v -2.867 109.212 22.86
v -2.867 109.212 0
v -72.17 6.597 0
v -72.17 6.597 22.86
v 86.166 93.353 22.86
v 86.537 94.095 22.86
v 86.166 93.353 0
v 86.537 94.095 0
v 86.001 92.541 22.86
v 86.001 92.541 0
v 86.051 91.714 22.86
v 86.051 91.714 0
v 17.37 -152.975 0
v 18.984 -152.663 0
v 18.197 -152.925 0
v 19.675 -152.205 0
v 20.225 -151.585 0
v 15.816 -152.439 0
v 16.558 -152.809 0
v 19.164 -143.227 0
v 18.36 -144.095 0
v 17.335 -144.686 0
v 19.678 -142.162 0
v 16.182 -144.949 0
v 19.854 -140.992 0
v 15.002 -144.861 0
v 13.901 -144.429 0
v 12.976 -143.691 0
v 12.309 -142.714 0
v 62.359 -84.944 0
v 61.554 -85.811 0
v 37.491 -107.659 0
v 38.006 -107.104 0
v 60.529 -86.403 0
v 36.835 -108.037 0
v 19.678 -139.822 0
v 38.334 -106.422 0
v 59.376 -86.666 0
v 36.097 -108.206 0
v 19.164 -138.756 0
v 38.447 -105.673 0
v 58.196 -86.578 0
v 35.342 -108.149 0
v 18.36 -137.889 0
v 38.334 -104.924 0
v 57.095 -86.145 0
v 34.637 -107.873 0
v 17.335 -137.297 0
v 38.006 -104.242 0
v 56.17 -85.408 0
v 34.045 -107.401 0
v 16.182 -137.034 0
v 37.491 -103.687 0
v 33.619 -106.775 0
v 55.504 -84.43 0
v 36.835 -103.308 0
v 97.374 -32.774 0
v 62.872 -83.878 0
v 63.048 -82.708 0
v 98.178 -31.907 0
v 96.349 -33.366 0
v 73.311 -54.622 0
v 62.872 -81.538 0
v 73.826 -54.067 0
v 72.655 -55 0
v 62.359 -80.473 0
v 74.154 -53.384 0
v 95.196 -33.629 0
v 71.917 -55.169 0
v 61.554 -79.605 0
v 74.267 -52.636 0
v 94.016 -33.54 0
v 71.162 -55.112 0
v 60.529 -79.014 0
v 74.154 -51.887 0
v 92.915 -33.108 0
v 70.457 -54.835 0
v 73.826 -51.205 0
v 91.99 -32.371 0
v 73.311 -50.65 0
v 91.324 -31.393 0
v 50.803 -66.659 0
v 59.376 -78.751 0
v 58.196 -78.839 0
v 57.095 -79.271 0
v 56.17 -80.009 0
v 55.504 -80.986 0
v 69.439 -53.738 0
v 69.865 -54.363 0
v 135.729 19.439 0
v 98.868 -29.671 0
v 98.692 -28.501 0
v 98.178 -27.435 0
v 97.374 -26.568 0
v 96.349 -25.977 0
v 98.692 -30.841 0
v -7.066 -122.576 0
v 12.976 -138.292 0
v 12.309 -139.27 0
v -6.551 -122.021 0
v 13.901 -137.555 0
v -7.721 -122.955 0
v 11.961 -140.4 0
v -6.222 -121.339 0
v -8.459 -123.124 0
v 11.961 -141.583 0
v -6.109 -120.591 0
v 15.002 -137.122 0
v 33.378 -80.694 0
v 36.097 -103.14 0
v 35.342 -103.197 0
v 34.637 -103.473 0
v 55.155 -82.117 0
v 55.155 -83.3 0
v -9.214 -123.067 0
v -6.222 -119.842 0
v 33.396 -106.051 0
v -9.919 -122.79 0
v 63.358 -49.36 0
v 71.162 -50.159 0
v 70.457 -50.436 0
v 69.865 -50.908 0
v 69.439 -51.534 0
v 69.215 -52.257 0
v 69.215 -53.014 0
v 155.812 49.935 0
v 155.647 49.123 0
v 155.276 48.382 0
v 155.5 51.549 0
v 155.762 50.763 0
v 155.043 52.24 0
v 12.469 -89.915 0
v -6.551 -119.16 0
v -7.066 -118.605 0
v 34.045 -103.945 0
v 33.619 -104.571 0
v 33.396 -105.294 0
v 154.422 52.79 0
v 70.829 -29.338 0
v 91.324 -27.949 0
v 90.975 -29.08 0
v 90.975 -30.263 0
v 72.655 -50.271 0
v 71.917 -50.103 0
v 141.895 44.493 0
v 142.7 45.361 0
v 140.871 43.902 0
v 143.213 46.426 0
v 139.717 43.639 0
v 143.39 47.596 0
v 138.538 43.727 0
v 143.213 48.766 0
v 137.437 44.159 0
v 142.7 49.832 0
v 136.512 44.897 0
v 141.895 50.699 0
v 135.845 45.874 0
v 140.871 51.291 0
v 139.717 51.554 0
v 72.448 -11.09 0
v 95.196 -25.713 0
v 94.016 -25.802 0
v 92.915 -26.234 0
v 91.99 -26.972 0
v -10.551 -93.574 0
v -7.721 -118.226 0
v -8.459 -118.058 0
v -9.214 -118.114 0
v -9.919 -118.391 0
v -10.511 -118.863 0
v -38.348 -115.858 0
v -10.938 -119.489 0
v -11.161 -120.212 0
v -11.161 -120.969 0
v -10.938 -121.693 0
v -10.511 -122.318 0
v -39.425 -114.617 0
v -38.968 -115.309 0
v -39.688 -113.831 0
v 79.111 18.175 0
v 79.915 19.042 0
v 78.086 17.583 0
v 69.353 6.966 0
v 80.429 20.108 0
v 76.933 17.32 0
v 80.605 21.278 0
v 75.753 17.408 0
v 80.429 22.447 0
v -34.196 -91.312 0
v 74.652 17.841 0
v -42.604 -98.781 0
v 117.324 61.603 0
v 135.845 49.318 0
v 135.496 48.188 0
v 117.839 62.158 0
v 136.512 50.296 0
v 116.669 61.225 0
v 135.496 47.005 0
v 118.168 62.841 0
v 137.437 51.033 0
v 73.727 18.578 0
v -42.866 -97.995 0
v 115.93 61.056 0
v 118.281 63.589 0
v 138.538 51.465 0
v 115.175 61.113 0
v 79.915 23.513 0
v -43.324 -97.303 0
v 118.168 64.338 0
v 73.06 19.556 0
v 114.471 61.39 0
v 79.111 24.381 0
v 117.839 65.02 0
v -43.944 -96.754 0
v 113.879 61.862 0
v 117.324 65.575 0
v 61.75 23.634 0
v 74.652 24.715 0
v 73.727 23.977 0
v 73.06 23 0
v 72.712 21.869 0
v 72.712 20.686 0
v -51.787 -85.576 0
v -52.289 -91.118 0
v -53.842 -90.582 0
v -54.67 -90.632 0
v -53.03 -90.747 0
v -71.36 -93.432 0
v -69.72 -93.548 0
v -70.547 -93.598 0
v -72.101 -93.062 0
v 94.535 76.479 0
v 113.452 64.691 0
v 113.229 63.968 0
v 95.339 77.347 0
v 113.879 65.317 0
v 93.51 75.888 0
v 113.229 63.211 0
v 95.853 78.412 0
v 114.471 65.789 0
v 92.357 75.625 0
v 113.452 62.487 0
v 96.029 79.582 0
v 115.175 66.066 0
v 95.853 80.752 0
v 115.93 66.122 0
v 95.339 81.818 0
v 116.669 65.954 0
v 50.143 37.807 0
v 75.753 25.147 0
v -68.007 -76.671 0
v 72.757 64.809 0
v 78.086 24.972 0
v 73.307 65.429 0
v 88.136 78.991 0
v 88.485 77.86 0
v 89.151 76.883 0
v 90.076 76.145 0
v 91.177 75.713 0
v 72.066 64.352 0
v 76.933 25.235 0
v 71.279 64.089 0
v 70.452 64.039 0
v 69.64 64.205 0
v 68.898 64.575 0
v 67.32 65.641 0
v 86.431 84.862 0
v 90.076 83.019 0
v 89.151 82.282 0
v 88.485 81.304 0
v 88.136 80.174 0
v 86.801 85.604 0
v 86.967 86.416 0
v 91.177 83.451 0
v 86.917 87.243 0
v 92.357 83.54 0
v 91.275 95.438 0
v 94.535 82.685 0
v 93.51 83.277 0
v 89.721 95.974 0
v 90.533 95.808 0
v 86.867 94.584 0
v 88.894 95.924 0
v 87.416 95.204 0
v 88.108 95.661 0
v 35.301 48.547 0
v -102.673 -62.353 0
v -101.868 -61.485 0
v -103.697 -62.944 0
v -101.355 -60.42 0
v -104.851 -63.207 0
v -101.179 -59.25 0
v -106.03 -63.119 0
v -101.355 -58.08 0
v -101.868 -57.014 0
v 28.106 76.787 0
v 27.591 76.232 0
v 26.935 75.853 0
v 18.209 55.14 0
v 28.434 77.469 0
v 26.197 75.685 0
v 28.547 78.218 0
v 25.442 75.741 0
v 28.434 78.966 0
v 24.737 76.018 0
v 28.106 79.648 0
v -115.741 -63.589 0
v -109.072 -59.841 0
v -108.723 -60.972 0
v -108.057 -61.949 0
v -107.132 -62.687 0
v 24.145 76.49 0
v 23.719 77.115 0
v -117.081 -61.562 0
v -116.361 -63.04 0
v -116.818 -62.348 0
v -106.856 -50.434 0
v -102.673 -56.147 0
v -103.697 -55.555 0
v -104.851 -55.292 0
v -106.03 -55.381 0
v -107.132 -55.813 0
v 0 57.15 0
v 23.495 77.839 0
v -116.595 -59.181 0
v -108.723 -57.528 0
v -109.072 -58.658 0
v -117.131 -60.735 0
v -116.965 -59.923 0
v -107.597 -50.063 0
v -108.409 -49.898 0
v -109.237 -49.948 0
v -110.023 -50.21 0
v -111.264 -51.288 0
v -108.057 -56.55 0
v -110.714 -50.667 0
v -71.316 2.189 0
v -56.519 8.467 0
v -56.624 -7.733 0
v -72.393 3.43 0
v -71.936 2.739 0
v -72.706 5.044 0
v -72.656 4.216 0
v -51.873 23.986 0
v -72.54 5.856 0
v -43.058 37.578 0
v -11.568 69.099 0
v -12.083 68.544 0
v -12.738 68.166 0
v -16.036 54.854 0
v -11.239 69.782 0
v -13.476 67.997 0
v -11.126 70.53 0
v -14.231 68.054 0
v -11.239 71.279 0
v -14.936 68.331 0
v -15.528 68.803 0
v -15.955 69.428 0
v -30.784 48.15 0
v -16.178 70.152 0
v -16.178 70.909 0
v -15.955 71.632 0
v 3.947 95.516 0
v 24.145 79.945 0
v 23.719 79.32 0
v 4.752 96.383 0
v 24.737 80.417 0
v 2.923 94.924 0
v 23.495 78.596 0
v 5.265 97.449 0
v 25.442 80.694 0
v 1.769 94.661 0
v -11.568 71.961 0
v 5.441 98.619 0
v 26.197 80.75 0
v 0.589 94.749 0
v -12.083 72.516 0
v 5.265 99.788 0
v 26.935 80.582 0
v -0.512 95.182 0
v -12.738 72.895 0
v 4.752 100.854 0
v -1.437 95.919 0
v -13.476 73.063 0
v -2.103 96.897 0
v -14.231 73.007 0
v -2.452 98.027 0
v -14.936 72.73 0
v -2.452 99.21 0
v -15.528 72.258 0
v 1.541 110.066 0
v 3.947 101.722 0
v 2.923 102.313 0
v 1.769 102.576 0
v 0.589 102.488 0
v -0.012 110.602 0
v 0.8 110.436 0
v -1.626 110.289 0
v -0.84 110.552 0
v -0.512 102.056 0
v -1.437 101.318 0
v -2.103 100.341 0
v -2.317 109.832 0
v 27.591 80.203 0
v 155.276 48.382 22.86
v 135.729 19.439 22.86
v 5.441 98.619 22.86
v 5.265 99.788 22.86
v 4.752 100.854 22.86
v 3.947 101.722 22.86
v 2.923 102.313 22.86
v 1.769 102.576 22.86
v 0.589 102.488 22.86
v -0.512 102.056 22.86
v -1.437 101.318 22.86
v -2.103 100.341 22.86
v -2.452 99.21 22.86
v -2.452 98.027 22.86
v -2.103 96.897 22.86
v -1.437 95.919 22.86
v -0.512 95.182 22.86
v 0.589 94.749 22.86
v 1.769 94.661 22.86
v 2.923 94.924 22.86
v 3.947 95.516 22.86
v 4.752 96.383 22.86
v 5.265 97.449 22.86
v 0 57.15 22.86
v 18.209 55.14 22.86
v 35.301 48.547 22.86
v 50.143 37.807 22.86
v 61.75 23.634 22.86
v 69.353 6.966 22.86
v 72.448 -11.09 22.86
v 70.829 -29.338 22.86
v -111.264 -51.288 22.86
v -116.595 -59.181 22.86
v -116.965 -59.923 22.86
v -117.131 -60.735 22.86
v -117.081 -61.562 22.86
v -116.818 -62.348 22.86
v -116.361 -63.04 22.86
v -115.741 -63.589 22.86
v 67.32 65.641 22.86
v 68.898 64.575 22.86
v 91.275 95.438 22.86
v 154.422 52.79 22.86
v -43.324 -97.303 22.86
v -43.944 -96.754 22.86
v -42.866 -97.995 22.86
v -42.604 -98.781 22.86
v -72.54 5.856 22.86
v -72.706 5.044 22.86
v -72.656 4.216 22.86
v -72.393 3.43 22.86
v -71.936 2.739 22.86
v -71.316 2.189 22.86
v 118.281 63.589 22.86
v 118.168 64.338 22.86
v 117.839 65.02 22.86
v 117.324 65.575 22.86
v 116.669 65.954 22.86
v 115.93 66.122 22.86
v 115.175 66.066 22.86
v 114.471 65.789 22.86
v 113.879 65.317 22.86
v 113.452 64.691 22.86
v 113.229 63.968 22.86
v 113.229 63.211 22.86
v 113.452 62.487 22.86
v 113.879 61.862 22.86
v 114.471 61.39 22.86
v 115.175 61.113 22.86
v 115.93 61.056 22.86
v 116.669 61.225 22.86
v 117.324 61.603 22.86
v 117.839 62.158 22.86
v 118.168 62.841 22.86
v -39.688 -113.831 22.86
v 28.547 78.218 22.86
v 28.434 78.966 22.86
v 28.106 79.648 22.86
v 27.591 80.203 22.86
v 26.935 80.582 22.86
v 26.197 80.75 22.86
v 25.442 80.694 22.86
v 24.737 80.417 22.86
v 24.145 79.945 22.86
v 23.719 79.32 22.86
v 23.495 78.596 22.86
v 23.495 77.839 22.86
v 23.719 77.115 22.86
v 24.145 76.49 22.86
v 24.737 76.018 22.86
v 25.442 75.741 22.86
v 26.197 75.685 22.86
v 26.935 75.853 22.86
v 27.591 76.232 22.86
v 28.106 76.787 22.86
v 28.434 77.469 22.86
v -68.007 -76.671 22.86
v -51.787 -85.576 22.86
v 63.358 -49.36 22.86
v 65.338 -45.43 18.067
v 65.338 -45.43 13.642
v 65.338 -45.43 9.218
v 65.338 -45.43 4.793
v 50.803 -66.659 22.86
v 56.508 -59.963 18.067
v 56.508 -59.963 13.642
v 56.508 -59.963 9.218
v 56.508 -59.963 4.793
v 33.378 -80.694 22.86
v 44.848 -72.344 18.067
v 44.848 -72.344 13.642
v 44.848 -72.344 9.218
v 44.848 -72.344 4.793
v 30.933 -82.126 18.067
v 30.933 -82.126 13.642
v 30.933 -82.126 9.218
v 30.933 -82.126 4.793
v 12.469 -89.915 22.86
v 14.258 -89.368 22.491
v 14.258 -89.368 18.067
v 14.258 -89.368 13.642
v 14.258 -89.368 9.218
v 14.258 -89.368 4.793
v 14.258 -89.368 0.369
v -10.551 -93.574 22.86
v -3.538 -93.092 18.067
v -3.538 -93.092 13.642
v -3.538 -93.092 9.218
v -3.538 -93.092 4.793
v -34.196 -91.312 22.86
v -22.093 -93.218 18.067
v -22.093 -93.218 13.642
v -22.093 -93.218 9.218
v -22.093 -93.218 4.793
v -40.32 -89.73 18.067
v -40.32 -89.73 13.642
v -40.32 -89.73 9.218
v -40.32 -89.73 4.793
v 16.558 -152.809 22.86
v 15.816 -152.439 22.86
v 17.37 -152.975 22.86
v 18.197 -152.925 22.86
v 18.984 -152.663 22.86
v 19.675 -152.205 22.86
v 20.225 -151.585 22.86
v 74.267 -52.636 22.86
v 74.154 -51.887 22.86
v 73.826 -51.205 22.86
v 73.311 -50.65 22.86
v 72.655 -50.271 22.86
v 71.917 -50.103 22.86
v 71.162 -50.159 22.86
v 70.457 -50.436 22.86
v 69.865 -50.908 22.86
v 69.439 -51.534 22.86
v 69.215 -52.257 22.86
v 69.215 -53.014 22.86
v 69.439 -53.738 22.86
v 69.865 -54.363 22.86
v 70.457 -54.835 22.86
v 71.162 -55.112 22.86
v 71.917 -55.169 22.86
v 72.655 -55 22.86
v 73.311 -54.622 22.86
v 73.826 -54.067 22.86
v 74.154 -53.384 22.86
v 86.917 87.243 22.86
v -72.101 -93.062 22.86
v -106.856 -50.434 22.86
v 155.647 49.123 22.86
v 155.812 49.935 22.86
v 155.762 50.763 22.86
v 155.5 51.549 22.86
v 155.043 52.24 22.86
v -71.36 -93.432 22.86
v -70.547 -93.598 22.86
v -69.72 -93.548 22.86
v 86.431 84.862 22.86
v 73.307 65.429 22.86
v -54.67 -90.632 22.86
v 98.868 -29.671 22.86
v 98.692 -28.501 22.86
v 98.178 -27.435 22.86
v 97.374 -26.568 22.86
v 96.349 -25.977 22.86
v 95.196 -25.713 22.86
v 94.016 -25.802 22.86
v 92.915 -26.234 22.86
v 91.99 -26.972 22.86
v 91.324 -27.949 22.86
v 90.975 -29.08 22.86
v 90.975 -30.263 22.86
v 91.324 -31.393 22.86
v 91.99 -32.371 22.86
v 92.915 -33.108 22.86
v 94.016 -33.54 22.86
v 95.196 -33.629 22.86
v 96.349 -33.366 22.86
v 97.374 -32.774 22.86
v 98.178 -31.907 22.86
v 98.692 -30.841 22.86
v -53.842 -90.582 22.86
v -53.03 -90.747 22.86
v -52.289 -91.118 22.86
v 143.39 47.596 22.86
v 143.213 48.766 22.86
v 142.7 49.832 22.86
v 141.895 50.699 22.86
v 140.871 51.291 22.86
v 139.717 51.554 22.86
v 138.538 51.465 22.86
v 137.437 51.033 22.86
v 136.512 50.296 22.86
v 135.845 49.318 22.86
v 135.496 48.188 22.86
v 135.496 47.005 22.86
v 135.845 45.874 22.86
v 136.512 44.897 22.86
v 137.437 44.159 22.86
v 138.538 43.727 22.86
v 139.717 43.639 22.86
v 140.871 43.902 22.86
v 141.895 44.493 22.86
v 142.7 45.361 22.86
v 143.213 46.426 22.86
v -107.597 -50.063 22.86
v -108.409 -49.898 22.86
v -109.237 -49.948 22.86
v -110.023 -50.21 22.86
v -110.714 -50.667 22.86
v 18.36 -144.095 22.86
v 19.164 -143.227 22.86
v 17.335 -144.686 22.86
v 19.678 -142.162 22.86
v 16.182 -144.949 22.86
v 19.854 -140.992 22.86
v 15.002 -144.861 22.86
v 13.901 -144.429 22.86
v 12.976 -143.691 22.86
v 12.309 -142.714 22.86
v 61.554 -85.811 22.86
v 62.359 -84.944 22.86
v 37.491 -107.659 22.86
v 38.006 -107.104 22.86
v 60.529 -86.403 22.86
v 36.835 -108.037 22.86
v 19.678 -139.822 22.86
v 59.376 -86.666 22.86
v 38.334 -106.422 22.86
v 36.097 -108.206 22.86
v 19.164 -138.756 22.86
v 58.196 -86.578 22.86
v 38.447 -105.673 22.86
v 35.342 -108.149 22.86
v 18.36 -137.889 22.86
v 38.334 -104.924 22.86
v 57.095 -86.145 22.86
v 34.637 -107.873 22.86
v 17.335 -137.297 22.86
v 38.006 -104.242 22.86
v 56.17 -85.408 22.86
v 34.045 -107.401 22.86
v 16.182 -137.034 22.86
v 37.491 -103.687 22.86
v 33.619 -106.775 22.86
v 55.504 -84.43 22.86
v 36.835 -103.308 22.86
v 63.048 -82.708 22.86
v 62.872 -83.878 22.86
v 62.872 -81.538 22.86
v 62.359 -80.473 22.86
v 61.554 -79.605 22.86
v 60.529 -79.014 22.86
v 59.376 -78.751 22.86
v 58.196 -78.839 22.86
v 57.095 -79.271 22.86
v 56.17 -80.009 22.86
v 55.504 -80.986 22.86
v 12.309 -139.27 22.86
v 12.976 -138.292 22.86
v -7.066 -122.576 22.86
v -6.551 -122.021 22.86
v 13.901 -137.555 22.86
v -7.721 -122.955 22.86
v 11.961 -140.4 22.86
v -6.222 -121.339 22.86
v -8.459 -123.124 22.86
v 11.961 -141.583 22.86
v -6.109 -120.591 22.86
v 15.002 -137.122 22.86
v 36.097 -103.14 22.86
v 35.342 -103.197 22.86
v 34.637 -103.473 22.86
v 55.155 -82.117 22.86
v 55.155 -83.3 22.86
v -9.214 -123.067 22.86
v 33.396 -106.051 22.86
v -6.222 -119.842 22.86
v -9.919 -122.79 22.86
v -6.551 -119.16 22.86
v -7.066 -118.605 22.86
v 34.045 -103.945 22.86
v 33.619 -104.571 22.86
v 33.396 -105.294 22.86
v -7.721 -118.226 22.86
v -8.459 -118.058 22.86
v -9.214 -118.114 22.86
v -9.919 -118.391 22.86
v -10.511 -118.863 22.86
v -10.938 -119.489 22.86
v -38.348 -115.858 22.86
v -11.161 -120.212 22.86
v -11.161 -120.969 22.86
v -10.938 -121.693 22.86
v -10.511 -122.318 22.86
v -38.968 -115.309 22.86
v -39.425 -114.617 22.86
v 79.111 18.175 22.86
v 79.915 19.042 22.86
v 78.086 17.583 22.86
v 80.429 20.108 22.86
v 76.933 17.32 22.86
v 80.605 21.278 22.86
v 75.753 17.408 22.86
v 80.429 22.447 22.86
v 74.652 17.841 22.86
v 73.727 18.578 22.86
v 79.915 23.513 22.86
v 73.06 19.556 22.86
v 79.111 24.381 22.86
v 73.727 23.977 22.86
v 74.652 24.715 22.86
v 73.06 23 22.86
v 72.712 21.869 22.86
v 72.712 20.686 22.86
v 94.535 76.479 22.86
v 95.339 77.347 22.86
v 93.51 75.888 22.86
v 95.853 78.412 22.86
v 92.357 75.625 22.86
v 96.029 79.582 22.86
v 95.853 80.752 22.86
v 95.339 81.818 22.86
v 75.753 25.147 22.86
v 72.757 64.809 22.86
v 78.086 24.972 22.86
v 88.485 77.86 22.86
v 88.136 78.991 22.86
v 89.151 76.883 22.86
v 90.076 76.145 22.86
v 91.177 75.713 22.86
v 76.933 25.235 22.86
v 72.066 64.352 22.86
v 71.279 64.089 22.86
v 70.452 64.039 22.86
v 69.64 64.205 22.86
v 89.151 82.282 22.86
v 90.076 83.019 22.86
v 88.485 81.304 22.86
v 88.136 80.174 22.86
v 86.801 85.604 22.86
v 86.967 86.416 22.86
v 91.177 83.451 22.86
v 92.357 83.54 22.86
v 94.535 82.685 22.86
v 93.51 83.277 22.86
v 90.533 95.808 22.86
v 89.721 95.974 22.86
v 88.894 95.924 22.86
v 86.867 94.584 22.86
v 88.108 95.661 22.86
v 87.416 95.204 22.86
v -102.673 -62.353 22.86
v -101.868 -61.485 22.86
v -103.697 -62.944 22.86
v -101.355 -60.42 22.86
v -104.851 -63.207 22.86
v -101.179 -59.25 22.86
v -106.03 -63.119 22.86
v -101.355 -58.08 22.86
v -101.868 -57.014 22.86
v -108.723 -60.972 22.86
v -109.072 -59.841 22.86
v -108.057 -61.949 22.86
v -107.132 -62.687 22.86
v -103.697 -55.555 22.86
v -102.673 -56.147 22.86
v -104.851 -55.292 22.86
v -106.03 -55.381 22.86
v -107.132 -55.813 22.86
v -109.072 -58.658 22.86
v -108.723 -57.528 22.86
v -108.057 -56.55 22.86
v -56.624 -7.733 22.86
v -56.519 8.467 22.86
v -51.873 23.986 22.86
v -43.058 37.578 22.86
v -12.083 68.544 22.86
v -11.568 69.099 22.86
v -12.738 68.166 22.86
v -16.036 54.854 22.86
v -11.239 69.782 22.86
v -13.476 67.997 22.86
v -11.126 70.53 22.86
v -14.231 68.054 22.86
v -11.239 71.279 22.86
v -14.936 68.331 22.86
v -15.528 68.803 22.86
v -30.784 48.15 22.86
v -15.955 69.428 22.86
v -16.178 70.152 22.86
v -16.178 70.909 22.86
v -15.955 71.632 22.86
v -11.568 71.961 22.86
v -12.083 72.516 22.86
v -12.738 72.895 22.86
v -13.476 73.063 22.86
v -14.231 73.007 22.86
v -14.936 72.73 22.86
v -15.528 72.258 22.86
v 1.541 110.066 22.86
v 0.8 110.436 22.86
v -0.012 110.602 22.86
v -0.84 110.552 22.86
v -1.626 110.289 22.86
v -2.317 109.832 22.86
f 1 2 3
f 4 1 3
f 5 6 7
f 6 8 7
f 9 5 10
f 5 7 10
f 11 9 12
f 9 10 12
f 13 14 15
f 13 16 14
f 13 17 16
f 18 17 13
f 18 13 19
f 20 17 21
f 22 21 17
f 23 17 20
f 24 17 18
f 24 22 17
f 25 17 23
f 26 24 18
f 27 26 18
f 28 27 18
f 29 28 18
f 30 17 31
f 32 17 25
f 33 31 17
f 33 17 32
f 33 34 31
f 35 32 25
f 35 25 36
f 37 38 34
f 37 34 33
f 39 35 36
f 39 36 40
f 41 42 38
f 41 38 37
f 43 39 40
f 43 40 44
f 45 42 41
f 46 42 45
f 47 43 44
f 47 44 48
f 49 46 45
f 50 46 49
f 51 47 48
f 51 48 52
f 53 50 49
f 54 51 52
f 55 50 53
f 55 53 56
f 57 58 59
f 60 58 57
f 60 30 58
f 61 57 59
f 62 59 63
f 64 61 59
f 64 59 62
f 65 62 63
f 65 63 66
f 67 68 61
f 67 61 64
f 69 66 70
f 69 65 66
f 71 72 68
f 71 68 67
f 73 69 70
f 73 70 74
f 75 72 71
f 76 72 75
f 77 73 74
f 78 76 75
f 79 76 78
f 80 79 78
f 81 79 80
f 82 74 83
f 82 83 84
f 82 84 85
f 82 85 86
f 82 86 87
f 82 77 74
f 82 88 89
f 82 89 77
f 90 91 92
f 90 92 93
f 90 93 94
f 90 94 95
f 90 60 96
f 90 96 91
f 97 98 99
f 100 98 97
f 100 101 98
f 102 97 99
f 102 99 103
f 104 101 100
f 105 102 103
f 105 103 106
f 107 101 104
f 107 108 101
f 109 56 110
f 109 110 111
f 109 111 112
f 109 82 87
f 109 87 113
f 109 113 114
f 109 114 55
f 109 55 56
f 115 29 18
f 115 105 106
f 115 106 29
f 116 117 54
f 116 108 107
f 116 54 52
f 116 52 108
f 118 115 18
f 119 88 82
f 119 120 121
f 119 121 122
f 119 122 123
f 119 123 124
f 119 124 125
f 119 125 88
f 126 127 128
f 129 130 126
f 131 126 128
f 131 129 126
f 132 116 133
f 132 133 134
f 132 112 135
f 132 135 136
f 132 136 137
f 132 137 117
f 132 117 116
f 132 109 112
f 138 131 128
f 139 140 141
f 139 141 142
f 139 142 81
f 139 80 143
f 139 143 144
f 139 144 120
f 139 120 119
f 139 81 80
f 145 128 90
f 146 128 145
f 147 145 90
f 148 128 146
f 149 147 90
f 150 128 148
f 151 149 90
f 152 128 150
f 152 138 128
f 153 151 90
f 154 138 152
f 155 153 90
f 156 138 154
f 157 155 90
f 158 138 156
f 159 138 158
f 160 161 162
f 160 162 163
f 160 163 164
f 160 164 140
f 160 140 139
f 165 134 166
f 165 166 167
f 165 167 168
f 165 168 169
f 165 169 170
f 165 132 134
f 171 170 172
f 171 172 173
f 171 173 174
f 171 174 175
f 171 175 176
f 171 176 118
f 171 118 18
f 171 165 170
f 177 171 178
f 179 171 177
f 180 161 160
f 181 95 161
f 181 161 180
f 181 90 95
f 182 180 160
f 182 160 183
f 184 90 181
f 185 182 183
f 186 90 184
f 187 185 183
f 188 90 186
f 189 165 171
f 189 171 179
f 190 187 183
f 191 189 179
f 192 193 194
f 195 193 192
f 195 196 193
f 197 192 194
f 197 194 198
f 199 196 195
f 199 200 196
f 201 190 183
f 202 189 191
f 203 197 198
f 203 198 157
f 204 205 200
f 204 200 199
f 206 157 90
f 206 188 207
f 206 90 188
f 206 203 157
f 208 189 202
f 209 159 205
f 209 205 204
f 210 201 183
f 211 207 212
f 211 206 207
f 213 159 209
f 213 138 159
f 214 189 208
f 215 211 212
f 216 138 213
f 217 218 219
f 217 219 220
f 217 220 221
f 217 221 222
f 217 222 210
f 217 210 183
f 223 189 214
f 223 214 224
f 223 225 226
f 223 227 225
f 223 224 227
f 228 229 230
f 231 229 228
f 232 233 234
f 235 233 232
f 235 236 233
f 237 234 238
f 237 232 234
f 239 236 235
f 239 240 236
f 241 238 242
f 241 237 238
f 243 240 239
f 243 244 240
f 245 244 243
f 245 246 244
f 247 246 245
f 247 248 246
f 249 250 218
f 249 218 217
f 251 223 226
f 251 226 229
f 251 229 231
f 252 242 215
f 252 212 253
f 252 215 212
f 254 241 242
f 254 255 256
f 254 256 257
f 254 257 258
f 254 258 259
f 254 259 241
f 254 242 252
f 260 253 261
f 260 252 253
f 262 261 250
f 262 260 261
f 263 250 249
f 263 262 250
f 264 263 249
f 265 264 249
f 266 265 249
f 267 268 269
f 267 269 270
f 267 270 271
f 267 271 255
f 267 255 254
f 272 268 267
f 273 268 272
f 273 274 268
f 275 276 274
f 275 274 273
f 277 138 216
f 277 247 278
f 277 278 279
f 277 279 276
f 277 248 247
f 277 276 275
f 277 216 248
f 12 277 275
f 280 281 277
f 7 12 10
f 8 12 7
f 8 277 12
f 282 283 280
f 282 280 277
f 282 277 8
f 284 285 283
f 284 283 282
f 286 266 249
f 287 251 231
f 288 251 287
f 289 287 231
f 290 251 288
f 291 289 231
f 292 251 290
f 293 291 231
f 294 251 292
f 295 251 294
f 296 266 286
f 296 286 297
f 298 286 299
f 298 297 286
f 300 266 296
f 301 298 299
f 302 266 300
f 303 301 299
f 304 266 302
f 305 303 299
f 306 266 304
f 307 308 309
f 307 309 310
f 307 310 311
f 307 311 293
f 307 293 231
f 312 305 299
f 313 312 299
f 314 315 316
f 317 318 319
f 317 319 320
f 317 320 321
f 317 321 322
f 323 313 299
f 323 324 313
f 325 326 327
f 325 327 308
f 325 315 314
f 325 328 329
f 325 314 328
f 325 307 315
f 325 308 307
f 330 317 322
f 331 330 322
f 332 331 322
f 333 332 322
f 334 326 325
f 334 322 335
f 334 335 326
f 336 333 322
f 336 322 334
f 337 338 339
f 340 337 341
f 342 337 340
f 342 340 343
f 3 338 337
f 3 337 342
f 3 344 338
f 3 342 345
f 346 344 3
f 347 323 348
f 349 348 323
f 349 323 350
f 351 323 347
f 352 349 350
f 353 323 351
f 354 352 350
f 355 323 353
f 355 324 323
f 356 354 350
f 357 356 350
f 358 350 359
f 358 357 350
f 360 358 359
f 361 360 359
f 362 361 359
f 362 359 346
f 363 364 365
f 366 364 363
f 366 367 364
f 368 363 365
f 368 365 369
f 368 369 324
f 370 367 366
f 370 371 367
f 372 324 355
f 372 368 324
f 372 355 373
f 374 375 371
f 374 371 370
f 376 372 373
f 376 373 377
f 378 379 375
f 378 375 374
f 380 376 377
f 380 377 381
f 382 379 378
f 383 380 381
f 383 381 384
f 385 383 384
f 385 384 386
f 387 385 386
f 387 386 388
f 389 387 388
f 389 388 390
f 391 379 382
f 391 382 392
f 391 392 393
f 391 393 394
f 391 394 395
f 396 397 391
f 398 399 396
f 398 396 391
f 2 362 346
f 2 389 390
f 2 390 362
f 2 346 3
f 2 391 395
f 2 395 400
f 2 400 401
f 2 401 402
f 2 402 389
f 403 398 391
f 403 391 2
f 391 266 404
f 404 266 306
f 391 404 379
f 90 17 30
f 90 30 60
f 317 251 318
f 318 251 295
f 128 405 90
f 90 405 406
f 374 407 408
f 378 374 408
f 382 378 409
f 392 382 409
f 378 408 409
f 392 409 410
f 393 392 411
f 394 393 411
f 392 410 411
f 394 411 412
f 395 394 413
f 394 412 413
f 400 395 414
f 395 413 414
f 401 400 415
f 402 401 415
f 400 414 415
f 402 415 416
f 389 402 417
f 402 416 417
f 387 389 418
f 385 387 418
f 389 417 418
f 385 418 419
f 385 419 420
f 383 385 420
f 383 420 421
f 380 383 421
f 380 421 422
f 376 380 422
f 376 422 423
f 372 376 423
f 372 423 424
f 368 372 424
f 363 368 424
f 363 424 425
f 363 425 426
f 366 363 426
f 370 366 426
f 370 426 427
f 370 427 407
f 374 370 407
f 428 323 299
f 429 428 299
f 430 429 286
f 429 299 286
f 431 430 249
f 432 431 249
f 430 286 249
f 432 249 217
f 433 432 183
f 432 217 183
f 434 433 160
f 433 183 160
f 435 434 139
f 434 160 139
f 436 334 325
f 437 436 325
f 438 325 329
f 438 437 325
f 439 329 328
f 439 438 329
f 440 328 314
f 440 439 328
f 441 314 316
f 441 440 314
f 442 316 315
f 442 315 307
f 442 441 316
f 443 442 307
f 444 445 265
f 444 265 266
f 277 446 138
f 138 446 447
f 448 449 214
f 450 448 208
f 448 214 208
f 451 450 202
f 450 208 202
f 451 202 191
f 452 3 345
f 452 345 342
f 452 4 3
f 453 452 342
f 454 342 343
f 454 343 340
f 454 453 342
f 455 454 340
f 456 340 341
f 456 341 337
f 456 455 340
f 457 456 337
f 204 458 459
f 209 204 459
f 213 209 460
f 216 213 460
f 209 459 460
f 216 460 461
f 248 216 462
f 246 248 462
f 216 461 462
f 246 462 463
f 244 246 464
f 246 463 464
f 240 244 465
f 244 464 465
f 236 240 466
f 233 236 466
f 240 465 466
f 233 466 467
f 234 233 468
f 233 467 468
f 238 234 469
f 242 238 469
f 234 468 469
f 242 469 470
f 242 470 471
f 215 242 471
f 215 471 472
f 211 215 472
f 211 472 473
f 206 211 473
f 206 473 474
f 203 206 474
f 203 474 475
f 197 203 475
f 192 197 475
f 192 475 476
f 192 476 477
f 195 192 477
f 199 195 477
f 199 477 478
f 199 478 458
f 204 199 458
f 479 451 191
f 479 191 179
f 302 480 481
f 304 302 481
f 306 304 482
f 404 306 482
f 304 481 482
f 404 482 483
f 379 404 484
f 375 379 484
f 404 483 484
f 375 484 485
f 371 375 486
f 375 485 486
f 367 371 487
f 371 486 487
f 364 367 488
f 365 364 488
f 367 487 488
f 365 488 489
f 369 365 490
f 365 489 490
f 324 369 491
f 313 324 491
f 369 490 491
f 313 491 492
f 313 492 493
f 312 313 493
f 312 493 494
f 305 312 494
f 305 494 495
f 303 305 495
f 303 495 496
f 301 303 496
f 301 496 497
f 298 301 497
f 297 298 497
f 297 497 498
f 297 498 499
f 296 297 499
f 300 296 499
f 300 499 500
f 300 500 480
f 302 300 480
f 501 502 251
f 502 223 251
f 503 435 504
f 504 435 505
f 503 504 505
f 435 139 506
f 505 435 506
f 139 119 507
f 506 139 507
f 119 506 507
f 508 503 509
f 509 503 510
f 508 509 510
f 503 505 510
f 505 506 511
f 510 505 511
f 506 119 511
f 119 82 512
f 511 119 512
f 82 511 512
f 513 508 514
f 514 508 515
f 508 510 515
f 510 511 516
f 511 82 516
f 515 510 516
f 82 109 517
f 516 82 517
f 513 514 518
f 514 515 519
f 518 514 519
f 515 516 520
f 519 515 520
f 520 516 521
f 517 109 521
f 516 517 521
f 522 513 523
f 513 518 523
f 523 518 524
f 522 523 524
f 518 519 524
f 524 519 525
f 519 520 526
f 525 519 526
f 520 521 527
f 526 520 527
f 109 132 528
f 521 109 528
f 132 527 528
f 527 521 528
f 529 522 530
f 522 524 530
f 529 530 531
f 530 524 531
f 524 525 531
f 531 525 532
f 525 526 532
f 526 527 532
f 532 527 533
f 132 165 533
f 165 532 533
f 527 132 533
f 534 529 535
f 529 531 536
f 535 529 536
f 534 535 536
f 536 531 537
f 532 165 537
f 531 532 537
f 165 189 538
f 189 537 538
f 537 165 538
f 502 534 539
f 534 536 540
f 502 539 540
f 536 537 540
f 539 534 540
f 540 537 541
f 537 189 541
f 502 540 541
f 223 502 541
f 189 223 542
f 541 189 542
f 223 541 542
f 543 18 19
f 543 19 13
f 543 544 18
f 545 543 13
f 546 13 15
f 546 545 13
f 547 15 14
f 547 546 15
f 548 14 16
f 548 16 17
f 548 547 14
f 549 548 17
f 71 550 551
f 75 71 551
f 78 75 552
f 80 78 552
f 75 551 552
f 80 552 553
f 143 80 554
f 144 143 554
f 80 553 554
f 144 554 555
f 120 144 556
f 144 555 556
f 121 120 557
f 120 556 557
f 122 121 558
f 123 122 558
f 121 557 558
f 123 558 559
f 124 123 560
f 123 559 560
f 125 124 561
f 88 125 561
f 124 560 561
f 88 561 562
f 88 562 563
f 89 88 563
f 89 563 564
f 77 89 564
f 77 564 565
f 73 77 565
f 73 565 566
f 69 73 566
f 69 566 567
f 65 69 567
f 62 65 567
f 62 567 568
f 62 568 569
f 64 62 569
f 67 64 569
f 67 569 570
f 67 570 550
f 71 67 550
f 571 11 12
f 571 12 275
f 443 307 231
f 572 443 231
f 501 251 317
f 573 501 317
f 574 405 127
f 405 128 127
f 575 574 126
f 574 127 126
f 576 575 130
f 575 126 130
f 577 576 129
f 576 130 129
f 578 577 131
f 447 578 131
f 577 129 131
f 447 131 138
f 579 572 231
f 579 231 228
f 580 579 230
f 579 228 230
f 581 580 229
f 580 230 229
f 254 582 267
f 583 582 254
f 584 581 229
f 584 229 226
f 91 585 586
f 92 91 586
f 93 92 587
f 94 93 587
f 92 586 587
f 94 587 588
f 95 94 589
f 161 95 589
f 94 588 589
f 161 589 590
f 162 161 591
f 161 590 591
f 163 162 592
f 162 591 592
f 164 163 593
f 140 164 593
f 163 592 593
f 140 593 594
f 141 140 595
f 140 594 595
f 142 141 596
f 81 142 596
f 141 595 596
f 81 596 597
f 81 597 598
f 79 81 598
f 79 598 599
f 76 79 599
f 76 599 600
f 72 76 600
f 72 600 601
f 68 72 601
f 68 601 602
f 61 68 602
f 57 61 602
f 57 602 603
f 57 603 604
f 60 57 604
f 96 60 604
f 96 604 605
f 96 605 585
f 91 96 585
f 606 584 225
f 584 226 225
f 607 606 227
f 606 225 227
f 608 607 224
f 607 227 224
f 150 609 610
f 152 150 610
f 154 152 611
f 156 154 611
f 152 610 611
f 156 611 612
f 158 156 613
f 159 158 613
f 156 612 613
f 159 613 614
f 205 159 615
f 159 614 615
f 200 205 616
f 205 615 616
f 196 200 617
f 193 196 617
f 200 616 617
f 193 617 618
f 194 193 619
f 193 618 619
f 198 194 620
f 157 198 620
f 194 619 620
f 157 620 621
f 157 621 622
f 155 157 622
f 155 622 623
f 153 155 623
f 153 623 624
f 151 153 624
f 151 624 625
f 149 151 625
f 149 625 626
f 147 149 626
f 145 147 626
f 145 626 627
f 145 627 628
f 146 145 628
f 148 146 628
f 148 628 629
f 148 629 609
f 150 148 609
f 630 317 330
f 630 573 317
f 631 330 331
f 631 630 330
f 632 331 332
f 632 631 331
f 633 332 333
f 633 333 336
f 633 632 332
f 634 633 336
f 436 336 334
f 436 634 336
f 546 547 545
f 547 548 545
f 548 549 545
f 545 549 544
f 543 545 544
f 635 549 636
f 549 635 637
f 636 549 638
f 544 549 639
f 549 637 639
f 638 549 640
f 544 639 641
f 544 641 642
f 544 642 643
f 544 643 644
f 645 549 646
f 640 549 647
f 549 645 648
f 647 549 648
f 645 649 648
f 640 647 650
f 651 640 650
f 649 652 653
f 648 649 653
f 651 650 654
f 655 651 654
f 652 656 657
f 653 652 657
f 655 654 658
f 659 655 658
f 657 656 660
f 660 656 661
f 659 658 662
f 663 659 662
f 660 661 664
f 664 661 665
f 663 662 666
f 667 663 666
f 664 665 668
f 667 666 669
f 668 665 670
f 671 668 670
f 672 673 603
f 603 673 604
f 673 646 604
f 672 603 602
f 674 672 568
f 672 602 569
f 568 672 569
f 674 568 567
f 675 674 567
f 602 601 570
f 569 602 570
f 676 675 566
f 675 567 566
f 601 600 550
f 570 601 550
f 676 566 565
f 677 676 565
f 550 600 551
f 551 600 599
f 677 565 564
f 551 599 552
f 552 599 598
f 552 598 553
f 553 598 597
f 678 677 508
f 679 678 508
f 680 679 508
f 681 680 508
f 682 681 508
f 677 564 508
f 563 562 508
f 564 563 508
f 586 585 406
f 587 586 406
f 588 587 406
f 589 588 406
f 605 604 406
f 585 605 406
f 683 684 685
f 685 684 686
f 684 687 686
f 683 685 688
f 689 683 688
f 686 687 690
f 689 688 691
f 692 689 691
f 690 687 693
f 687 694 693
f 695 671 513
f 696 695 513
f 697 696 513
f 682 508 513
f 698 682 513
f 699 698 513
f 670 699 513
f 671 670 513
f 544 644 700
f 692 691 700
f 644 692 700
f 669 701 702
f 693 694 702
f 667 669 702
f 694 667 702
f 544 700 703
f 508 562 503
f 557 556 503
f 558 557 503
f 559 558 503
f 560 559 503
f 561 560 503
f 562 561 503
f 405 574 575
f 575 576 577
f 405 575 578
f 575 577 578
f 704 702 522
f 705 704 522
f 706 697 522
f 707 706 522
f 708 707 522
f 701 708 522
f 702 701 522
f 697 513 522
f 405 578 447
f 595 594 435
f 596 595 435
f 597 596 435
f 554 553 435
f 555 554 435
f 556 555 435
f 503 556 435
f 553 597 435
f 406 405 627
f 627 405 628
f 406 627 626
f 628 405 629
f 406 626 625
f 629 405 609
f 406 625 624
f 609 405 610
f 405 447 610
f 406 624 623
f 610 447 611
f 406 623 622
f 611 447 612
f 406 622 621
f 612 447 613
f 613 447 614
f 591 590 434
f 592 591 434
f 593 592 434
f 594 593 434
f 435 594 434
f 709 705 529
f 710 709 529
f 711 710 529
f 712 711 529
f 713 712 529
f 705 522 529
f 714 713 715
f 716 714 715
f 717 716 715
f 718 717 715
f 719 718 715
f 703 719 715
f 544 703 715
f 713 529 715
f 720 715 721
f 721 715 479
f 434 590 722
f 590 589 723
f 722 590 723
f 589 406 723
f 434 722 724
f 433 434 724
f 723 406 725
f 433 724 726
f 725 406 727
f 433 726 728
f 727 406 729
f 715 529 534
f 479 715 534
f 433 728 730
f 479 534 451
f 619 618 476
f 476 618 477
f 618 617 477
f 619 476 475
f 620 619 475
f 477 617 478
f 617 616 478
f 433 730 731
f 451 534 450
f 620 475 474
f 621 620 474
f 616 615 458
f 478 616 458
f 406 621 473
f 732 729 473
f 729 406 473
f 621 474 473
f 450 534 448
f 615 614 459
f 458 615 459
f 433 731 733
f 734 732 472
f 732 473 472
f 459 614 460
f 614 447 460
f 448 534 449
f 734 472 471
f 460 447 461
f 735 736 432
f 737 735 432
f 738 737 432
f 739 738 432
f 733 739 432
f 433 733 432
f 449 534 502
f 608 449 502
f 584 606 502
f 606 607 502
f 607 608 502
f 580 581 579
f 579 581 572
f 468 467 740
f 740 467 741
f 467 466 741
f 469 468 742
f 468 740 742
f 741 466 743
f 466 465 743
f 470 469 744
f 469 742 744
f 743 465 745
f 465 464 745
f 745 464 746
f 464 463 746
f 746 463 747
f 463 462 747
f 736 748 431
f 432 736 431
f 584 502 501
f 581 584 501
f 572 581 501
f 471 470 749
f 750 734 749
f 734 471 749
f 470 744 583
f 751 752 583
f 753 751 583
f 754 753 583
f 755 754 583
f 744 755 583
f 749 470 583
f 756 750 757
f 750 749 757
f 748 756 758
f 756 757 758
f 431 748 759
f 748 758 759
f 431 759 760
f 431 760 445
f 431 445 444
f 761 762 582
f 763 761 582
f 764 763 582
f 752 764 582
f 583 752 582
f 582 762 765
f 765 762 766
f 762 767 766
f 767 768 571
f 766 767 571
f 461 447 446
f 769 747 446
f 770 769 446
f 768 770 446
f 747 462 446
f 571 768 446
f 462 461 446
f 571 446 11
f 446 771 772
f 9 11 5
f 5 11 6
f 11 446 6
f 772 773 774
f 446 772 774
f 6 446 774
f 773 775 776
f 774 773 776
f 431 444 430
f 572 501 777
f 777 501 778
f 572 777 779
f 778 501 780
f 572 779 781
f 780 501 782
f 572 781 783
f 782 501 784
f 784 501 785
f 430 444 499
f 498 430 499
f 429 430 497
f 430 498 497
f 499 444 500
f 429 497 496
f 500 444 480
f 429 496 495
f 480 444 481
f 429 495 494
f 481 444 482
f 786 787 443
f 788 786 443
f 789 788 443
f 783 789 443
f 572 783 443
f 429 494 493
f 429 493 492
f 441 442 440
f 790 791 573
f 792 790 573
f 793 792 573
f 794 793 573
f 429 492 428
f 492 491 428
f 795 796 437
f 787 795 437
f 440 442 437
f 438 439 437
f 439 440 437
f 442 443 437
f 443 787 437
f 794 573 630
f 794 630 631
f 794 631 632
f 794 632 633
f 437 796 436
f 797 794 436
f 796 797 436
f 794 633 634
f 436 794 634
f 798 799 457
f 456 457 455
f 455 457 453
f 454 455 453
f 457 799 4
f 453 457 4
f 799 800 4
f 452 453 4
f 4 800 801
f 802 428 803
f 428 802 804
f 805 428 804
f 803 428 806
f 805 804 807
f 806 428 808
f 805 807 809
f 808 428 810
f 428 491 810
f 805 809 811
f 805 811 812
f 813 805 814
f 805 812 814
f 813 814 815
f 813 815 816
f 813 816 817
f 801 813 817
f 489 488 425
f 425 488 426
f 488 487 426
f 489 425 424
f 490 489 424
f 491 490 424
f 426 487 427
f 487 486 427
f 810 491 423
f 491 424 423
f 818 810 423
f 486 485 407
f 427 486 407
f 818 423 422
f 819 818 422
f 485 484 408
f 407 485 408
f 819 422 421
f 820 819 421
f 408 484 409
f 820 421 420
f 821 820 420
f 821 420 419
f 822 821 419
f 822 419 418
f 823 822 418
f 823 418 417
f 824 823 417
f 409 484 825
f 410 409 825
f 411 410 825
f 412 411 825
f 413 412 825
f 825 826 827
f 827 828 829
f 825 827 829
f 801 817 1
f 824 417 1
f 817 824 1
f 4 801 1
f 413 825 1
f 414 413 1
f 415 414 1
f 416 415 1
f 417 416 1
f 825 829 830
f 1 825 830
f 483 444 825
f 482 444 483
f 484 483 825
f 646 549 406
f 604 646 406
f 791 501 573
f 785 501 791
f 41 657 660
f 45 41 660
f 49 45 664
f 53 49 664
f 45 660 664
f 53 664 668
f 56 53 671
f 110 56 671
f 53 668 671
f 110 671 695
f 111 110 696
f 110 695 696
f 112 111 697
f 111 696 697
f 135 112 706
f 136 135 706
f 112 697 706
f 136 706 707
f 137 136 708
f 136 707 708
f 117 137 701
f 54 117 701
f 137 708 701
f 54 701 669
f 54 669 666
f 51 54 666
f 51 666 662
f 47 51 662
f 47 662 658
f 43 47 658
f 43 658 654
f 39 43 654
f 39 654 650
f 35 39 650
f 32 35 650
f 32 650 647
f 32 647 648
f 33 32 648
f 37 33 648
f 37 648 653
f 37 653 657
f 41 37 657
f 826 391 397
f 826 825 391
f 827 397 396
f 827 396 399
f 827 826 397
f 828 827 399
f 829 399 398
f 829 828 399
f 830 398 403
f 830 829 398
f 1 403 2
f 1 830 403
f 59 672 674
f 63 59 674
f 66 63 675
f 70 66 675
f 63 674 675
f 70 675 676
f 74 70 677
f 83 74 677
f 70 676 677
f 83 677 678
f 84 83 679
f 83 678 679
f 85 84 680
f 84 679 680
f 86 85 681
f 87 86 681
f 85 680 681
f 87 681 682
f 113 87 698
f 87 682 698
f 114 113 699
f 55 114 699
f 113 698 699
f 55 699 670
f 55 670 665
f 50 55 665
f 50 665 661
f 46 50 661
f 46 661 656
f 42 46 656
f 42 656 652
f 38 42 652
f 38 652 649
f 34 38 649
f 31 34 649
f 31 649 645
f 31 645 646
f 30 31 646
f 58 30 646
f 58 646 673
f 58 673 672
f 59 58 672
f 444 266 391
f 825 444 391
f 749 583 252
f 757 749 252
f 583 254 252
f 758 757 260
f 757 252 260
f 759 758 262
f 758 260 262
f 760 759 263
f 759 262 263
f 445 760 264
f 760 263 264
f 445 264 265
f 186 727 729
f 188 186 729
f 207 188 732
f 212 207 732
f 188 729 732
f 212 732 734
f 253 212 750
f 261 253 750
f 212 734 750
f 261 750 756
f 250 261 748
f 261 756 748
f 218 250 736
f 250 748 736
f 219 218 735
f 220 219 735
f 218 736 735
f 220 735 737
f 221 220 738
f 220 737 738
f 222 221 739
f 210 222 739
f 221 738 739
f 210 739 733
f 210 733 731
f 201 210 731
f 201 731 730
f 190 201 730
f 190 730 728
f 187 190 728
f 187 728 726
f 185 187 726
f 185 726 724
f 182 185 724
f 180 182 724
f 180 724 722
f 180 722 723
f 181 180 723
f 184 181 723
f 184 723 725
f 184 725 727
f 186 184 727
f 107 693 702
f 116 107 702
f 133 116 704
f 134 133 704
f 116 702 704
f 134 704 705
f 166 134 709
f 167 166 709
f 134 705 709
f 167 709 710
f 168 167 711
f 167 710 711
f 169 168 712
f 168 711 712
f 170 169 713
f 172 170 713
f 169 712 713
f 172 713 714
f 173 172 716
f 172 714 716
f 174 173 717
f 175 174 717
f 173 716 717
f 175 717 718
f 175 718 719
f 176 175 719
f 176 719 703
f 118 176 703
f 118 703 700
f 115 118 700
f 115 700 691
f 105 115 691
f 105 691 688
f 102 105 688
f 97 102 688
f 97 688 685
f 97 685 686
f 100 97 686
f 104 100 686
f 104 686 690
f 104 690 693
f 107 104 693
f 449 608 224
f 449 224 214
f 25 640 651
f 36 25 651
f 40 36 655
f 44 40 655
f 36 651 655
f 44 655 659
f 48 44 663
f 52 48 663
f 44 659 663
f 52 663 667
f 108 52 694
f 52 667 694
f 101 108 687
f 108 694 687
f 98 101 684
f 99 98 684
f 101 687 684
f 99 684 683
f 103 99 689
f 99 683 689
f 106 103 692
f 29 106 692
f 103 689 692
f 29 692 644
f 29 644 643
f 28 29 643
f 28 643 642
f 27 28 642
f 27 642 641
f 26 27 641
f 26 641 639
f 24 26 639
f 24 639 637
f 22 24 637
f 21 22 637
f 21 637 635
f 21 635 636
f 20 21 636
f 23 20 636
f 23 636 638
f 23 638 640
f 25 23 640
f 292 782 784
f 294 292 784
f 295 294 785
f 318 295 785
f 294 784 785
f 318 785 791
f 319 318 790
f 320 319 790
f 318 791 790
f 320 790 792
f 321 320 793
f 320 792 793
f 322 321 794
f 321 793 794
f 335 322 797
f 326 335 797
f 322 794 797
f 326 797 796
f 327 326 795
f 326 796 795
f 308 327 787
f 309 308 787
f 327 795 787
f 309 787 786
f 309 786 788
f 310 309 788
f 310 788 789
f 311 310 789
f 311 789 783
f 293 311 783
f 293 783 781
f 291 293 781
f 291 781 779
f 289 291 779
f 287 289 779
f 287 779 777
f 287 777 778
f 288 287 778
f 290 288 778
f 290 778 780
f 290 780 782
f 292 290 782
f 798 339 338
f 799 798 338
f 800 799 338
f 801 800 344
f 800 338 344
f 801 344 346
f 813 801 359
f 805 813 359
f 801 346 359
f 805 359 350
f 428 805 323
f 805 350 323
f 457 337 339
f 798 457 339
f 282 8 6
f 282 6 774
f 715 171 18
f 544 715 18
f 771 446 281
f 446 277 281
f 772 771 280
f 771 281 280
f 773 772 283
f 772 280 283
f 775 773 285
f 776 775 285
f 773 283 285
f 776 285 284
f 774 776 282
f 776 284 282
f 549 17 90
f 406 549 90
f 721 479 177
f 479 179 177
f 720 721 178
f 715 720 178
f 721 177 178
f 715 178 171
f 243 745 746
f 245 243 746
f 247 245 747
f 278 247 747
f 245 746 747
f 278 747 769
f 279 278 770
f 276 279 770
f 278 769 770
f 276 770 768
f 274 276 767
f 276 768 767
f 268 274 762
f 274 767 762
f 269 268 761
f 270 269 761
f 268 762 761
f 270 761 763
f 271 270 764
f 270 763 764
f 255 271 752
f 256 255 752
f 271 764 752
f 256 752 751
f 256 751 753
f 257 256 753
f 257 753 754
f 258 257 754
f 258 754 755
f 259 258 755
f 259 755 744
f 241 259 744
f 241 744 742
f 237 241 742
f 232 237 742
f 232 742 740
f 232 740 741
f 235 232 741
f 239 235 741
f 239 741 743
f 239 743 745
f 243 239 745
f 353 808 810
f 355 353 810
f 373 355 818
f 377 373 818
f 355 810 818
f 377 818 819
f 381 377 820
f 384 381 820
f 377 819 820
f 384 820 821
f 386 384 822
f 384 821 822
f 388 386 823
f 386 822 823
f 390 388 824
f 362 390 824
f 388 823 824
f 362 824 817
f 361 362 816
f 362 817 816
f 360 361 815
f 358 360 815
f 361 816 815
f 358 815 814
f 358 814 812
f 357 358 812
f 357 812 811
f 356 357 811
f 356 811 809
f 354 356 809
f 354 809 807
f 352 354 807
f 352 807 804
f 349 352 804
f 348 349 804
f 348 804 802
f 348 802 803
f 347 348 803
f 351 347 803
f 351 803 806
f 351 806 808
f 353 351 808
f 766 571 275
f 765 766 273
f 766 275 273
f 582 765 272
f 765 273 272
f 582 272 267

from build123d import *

# Parameters (mm, degrees)
BOSS_EXTRUDE2_DEPTH = 22.86
CUT_EXTRUDE1_DEPTH  = 23.8600001
SKETCH10_R          = 3.96875
CUT_EXTRUDE2_DEPTH  = 23.8600001
BOSS_EXTRUDE4_DEPTH = 22.86
SKETCH13_R          = 3.96875
CUT_EXTRUDE5_DEPTH  = 23.8600001
LPATTERN1_COUNT     = 2
LPATTERN1_PITCH     = 64
SKETCH14_R          = 2.54
CUT_EXTRUDE6_DEPTH  = 23.8600001
SKETCH15_R          = 3.96875
CUT_EXTRUDE7_DEPTH  = 23.8600001
SKETCH16_R          = 3.96875
CUT_EXTRUDE8_DEPTH  = 23.8600001
SKETCH19_R          = 3.96875
CUT_EXTRUDE11_DEPTH = 23.8600001
SKETCH21_R          = 2.54
CUT_EXTRUDE12_DEPTH = 23.8600001
SKETCH23_R          = 4.16785984
SKETCH23_R_2        = 4.440390953
BOSS_EXTRUDE5_DEPTH = 22.86
CUT_EXTRUDE13_DEPTH = 23.8600001
FILLET1_R           = 3.175


with BuildPart() as part:
    # Sketch6 → Boss-Extrude2 (new body)
    with BuildSketch(Plane.XY):
        with BuildLine():
            Line((-68.006850091, -76.67090114), (-109.486767671, -48.656527855))
            Line((-109.486767671, -48.656527855), (-118.371760678, -61.812230963))
            Line((-118.371760678, -61.812230963), (18.447551645, -154.216158235))
            Line((18.447551645, -154.216158235), (135.729459338, 19.43912279))
            Line((135.729459338, 19.43912279), (-1.089852986, 111.843050063))
            Line((-1.089852986, 111.843050063), (-73.946795643, 3.966284577))
            Line((-73.946795643, 3.966284577), (-56.624438948, -7.732749433))
            ThreePointArc((-56.624438948, -7.732749433), (-43.058385537, 37.577891571), (0, 57.15))
            ThreePointArc((0, 57.15), (56.404848571, 31.095576642), (70.829334649, -29.338471048))
            add(Edge.make_bspline(
                [(70.829334649, -29.338471048), (70.811686062, -29.418295928), (70.776015112, -29.578104383), (70.713320217, -29.85478305), (70.619021771, -30.262929245), (70.501052001, -30.762086912), (70.364034474, -31.322191481), (70.199318515, -31.970958926), (70.000453855, -32.723919765), (69.795103485, -33.469783355), (69.582015398, -34.214296028), (69.361377803, -34.956693289), (69.133257682, -35.696762218), (68.838782679, -36.61892651), (68.470566207, -37.720710028), (68.019498024, -38.998776477), (67.474836154, -40.448808619), (66.901337925, -41.887676852), (66.299328392, -43.31485223), (65.669141732, -44.729810424), (65.011119088, -46.132040323), (64.325609411, -47.52103904), (63.612968547, -48.896314904), (62.87355937, -50.257385735), (62.107751613, -51.603779381), (61.315921169, -52.935034173), (60.49845004, -54.250698756), (59.655726138, -55.550331897), (58.571247582, -57.154294757), (57.220953058, -59.045283389), (55.576035723, -61.200397094), (53.604026134, -63.590264702), (51.54329346, -65.904053004), (49.39728314, -68.138962994), (47.169496434, -70.29235602), (44.863486103, -72.361752995), (42.482847363, -74.344831806), (40.031215607, -76.239428526), (36.882516177, -78.494556171), (32.976808929, -81.016011003), (28.250788286, -83.68089187), (21.41551215, -86.919136497), (14.30829026, -89.526654921), (6.996956895, -91.488176442), (-0.451922312, -92.797413176), (-6.61686174, -93.456358442), (-12.81195397, -93.702029749), (-19.009644204, -93.537285056), (-25.183124422, -92.966685286), (-31.306438312, -91.996382122), (-36.598524037, -90.804323442), (-41.072542301, -89.543185606), (-44.752319298, -88.33589156), (-47.664184976, -87.27761875), (-50.541347258, -86.128353728), (-53.381128552, -84.889612663), (-56.180924218, -83.562977818), (-58.593536599, -82.326710176), (-60.633378351, -81.214215821), (-62.313751085, -80.252471782), (-63.646071553, -79.462491566), (-64.966093336, -78.652178853), (-66.222359154, -77.854259082), (-67.143044791, -77.250601571), (-67.736251212, -76.85365602), (-68.006850091, -76.67090114)],
                knots=[0.071020771, 0.071020771, 0.071020771, 0.071020771, 0.071020771, 0.072848477, 0.074676184, 0.07650389, 0.078331597, 0.08198701, 0.085642423, 0.089297836, 0.092953249, 0.096608662, 0.100264075, 0.103919488, 0.107574901, 0.114885727, 0.122196554, 0.12950738, 0.136818214, 0.144129048, 0.151439882, 0.158750716, 0.166061558, 0.173372401, 0.180683243, 0.187994085, 0.195304924, 0.202615763, 0.209926602, 0.217237441, 0.231859103, 0.246480766, 0.261102426, 0.275724085, 0.290345754, 0.304967424, 0.319589099, 0.334210774, 0.348832457, 0.36345414, 0.392697464, 0.421940789, 0.451184112, 0.506140643, 0.535383973, 0.564627303, 0.593870641, 0.623113979, 0.652357319, 0.68160066, 0.710843985, 0.740087309, 0.754708984, 0.769330659, 0.783952333, 0.798574008, 0.813195669, 0.82781733, 0.842438991, 0.849749821, 0.857060652, 0.86437149, 0.871682327, 0.878993165, 0.885158103, 0.885158103, 0.885158103, 0.885158103, 0.885158103], degree=4))
        make_face()
    extrude(amount=BOSS_EXTRUDE2_DEPTH)

    # Sketch8 → Cut-Extrude1 (cut, through all)
    with BuildSketch(Plane.XY.offset(22.86)):
        Polygon((-71.011229489, -93.798205788), (-53.378672597, -90.381637707), (-42.854110111, -97.489632113), (-39.43754203, -115.122189004), align=None)
    extrude(amount=-CUT_EXTRUDE1_DEPTH, mode=Mode.SUBTRACT)

    # Sketch10 → Cut-Extrude2 (cut, through all)
    with BuildSketch(Plane.XY.offset(22.86)):
        with Locations((4.996496209, -84.796642912)):
            Circle(SKETCH10_R)
        with Locations((40.816310536, -31.759477627)):
            Circle(SKETCH10_R)
        with Locations((76.636124864, 21.277687659)):
            Circle(SKETCH10_R)
        with Locations((-45.295165913, -45.214466102)):
            Circle(SKETCH10_R)
    extrude(amount=-CUT_EXTRUDE2_DEPTH, mode=Mode.SUBTRACT)

    # Sketch12 → Boss-Extrude4 (add, through all)
    with BuildSketch(Plane.XY.offset(22.86)):
        Polygon((135.729459338, 19.43912279), (67.319803176, 65.641086427), (88.643786393, 97.214773886), (157.053442554, 51.01281025), align=None)
    extrude(amount=-BOSS_EXTRUDE4_DEPTH)

    # Sketch13 → Cut-Extrude5 (cut, through all)
    with BuildSketch(Plane.XY.offset(22.86)):
        with Locations((94.899221836, -29.671127724)):
            Circle(SKETCH13_R)
    cut_extrude5 = extrude(amount=-CUT_EXTRUDE5_DEPTH, mode=Mode.SUBTRACT)

    # LPattern1: Cut-Extrude5 ×2
    with Locations(*[Vector(-0.559684599, -0.828705708, 0) * (i * LPATTERN1_PITCH) for i in range(1, LPATTERN1_COUNT)]):
        add(cut_extrude5, mode=Mode.SUBTRACT)

    # Sketch14 → Cut-Extrude6 (cut, through all)
    with BuildSketch(Plane.XY.offset(22.86)):
        with Locations((71.72703343, -52.635713164)):
            Circle(SKETCH14_R)
        with Locations((35.907219102, -105.67287845)):
            Circle(SKETCH14_R)
        with Locations((115.740620068, 63.589229581)):
            Circle(SKETCH14_R)
    extrude(amount=-CUT_EXTRUDE6_DEPTH, mode=Mode.SUBTRACT)

    # Sketch15 → Cut-Extrude7 (cut, through all)
    with BuildSketch(Plane.XY.offset(22.86)):
        with Locations((-105.147343009, -59.249804902)):
            Circle(SKETCH15_R)
        with Locations((15.885125585, -140.991740566)):
            Circle(SKETCH15_R)
        with Locations((1.472573075, 98.618632394)):
            Circle(SKETCH15_R)
    extrude(amount=-CUT_EXTRUDE7_DEPTH, mode=Mode.SUBTRACT)

    # Sketch16 → Cut-Extrude8 (cut, through all)
    with BuildSketch(Plane.XY.offset(22.86)):
        with Locations((92.060354474, 79.582216994)):
            Circle(SKETCH16_R)
        with Locations((139.420885662, 47.596242169)):
            Circle(SKETCH16_R)
    extrude(amount=-CUT_EXTRUDE8_DEPTH, mode=Mode.SUBTRACT)

    # Sketch19 → Cut-Extrude11 (cut, through all)
    with BuildSketch(Plane.XY.offset(22.86)):
        with Locations((-65.680233685, -85.904783923)):
            Circle(SKETCH19_R)
    extrude(amount=-CUT_EXTRUDE11_DEPTH, mode=Mode.SUBTRACT)

    # Sketch21 → Cut-Extrude12 (cut, through all)
    with BuildSketch(Plane.XY.offset(22.86)):
        with Locations((-13.666272317, 70.530227577)):
            Circle(SKETCH21_R)
        with Locations((26.00698069, 78.217505758)):
            Circle(SKETCH21_R)
        with Locations((-86.729358658, -71.688795112)):
            Circle(SKETCH21_R)
        with Locations((-8.64928203, -120.590613931)):
            Circle(SKETCH21_R)
    extrude(amount=-CUT_EXTRUDE12_DEPTH, mode=Mode.SUBTRACT)

    # Sketch23 → Boss-Extrude5 (add, through all)
    with BuildSketch(Plane.XY.offset(22.86)):
        with Locations((-65.680233685, -85.904783923)):
            Circle(SKETCH23_R)
        with Locations((-86.729358658, -71.688795112)):
            Circle(SKETCH23_R_2)
    extrude(amount=-BOSS_EXTRUDE5_DEPTH)

    # Sketch25 → Cut-Extrude13 (cut, through all)
    with BuildSketch(Plane.XY.offset(22.86)):
        Polygon((85.800588631, 93.004948891), (87.167215863, 85.951926135), (71.529628171, 62.797888664), (67.319803176, 65.641086427), align=None)
    extrude(amount=-CUT_EXTRUDE13_DEPTH, mode=Mode.SUBTRACT)

    # Fillet1
    fillet1_edges = [part.edges().sort_by_distance(p)[0] for p in [
        (-73.946795643, 3.966284577, 11.43),
        (-1.089852986, 111.843050063, 11.43),
        (18.447551645, -154.216158235, 11.43),
        (-118.371760678, -61.812230963, 11.43),
        (-109.486767671, -48.656527855, 11.43),
        (85.800588631, 93.004948891, 11.43),
        (87.167215863, 85.951926135, 11.43),
        (71.529628171, 62.797888664, 11.43),
        (-39.43754203, -115.122189004, 11.43),
        (-71.011229489, -93.798205788, 11.43),
        (-53.378672597, -90.381637707, 11.43),
        (-42.854110111, -97.489632113, 11.43),
        (157.053442554, 51.01281025, 11.43),
        (88.643786393, 97.214773886, 11.43),
    ]]
    fillet(fillet1_edges, radius=FILLET1_R)


solid = part.part
